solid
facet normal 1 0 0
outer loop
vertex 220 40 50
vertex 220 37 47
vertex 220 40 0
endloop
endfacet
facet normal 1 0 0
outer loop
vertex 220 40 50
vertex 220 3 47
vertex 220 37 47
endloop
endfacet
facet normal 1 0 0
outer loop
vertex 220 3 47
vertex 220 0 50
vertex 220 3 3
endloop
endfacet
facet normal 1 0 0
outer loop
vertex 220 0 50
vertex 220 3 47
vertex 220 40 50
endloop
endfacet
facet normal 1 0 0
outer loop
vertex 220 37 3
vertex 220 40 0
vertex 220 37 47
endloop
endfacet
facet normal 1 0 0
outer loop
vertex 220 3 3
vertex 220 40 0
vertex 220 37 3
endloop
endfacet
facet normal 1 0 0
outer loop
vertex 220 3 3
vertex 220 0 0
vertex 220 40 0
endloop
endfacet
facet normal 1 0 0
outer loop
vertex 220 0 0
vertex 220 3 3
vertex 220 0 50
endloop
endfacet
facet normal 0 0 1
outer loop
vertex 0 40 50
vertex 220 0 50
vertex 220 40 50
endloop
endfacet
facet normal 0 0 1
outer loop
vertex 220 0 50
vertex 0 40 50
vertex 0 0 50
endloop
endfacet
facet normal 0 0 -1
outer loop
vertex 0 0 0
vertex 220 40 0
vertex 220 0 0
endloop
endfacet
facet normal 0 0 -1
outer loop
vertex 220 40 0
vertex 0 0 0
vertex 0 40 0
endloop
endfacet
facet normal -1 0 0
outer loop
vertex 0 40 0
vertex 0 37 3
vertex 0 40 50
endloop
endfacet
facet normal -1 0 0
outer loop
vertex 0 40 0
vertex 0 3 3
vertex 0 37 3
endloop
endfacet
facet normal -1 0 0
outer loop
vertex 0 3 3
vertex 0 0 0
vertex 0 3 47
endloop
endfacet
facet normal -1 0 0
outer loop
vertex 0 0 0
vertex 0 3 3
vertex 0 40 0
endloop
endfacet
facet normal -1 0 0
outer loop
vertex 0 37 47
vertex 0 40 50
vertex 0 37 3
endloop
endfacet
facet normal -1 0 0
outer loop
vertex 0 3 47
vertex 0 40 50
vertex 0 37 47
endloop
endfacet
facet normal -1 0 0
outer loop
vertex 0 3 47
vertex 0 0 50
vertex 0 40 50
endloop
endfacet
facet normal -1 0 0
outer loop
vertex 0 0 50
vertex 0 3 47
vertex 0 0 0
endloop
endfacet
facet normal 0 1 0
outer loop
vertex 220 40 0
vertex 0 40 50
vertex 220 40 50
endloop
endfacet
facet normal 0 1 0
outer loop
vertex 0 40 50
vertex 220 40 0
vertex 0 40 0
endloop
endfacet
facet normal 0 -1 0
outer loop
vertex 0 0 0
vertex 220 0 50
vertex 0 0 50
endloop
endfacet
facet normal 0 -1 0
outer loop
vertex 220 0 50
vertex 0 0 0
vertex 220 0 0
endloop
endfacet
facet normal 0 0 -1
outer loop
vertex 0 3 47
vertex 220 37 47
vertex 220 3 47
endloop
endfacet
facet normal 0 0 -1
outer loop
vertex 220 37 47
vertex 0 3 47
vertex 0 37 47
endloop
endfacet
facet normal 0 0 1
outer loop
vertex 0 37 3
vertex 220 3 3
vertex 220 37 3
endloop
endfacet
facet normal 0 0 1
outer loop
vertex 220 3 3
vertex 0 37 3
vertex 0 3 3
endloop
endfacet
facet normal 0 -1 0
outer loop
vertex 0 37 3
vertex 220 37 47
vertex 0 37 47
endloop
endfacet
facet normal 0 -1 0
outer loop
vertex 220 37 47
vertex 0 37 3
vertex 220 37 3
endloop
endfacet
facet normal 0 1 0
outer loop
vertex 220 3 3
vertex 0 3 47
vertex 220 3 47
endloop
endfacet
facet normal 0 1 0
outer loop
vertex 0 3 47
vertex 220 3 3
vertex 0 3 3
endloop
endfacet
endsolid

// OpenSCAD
$fn = 32;

// ----------------------------------------------------------------------
// Box beam: 200-250 mm hollow beam
// ----------------------------------------------------------------------

// --- parameters (mm) ---
beam_l = 220;             // beam length, X
beam_w = 40;              // beam width, Y
beam_h = 50;              // beam height, Z
wall = 3;                 // wall thickness

difference() {
  cube([beam_l, beam_w, beam_h]);
  translate([-1, wall, wall])
    cube([beam_l + 2, beam_w - 2 * wall, beam_h - 2 * wall]);
}
